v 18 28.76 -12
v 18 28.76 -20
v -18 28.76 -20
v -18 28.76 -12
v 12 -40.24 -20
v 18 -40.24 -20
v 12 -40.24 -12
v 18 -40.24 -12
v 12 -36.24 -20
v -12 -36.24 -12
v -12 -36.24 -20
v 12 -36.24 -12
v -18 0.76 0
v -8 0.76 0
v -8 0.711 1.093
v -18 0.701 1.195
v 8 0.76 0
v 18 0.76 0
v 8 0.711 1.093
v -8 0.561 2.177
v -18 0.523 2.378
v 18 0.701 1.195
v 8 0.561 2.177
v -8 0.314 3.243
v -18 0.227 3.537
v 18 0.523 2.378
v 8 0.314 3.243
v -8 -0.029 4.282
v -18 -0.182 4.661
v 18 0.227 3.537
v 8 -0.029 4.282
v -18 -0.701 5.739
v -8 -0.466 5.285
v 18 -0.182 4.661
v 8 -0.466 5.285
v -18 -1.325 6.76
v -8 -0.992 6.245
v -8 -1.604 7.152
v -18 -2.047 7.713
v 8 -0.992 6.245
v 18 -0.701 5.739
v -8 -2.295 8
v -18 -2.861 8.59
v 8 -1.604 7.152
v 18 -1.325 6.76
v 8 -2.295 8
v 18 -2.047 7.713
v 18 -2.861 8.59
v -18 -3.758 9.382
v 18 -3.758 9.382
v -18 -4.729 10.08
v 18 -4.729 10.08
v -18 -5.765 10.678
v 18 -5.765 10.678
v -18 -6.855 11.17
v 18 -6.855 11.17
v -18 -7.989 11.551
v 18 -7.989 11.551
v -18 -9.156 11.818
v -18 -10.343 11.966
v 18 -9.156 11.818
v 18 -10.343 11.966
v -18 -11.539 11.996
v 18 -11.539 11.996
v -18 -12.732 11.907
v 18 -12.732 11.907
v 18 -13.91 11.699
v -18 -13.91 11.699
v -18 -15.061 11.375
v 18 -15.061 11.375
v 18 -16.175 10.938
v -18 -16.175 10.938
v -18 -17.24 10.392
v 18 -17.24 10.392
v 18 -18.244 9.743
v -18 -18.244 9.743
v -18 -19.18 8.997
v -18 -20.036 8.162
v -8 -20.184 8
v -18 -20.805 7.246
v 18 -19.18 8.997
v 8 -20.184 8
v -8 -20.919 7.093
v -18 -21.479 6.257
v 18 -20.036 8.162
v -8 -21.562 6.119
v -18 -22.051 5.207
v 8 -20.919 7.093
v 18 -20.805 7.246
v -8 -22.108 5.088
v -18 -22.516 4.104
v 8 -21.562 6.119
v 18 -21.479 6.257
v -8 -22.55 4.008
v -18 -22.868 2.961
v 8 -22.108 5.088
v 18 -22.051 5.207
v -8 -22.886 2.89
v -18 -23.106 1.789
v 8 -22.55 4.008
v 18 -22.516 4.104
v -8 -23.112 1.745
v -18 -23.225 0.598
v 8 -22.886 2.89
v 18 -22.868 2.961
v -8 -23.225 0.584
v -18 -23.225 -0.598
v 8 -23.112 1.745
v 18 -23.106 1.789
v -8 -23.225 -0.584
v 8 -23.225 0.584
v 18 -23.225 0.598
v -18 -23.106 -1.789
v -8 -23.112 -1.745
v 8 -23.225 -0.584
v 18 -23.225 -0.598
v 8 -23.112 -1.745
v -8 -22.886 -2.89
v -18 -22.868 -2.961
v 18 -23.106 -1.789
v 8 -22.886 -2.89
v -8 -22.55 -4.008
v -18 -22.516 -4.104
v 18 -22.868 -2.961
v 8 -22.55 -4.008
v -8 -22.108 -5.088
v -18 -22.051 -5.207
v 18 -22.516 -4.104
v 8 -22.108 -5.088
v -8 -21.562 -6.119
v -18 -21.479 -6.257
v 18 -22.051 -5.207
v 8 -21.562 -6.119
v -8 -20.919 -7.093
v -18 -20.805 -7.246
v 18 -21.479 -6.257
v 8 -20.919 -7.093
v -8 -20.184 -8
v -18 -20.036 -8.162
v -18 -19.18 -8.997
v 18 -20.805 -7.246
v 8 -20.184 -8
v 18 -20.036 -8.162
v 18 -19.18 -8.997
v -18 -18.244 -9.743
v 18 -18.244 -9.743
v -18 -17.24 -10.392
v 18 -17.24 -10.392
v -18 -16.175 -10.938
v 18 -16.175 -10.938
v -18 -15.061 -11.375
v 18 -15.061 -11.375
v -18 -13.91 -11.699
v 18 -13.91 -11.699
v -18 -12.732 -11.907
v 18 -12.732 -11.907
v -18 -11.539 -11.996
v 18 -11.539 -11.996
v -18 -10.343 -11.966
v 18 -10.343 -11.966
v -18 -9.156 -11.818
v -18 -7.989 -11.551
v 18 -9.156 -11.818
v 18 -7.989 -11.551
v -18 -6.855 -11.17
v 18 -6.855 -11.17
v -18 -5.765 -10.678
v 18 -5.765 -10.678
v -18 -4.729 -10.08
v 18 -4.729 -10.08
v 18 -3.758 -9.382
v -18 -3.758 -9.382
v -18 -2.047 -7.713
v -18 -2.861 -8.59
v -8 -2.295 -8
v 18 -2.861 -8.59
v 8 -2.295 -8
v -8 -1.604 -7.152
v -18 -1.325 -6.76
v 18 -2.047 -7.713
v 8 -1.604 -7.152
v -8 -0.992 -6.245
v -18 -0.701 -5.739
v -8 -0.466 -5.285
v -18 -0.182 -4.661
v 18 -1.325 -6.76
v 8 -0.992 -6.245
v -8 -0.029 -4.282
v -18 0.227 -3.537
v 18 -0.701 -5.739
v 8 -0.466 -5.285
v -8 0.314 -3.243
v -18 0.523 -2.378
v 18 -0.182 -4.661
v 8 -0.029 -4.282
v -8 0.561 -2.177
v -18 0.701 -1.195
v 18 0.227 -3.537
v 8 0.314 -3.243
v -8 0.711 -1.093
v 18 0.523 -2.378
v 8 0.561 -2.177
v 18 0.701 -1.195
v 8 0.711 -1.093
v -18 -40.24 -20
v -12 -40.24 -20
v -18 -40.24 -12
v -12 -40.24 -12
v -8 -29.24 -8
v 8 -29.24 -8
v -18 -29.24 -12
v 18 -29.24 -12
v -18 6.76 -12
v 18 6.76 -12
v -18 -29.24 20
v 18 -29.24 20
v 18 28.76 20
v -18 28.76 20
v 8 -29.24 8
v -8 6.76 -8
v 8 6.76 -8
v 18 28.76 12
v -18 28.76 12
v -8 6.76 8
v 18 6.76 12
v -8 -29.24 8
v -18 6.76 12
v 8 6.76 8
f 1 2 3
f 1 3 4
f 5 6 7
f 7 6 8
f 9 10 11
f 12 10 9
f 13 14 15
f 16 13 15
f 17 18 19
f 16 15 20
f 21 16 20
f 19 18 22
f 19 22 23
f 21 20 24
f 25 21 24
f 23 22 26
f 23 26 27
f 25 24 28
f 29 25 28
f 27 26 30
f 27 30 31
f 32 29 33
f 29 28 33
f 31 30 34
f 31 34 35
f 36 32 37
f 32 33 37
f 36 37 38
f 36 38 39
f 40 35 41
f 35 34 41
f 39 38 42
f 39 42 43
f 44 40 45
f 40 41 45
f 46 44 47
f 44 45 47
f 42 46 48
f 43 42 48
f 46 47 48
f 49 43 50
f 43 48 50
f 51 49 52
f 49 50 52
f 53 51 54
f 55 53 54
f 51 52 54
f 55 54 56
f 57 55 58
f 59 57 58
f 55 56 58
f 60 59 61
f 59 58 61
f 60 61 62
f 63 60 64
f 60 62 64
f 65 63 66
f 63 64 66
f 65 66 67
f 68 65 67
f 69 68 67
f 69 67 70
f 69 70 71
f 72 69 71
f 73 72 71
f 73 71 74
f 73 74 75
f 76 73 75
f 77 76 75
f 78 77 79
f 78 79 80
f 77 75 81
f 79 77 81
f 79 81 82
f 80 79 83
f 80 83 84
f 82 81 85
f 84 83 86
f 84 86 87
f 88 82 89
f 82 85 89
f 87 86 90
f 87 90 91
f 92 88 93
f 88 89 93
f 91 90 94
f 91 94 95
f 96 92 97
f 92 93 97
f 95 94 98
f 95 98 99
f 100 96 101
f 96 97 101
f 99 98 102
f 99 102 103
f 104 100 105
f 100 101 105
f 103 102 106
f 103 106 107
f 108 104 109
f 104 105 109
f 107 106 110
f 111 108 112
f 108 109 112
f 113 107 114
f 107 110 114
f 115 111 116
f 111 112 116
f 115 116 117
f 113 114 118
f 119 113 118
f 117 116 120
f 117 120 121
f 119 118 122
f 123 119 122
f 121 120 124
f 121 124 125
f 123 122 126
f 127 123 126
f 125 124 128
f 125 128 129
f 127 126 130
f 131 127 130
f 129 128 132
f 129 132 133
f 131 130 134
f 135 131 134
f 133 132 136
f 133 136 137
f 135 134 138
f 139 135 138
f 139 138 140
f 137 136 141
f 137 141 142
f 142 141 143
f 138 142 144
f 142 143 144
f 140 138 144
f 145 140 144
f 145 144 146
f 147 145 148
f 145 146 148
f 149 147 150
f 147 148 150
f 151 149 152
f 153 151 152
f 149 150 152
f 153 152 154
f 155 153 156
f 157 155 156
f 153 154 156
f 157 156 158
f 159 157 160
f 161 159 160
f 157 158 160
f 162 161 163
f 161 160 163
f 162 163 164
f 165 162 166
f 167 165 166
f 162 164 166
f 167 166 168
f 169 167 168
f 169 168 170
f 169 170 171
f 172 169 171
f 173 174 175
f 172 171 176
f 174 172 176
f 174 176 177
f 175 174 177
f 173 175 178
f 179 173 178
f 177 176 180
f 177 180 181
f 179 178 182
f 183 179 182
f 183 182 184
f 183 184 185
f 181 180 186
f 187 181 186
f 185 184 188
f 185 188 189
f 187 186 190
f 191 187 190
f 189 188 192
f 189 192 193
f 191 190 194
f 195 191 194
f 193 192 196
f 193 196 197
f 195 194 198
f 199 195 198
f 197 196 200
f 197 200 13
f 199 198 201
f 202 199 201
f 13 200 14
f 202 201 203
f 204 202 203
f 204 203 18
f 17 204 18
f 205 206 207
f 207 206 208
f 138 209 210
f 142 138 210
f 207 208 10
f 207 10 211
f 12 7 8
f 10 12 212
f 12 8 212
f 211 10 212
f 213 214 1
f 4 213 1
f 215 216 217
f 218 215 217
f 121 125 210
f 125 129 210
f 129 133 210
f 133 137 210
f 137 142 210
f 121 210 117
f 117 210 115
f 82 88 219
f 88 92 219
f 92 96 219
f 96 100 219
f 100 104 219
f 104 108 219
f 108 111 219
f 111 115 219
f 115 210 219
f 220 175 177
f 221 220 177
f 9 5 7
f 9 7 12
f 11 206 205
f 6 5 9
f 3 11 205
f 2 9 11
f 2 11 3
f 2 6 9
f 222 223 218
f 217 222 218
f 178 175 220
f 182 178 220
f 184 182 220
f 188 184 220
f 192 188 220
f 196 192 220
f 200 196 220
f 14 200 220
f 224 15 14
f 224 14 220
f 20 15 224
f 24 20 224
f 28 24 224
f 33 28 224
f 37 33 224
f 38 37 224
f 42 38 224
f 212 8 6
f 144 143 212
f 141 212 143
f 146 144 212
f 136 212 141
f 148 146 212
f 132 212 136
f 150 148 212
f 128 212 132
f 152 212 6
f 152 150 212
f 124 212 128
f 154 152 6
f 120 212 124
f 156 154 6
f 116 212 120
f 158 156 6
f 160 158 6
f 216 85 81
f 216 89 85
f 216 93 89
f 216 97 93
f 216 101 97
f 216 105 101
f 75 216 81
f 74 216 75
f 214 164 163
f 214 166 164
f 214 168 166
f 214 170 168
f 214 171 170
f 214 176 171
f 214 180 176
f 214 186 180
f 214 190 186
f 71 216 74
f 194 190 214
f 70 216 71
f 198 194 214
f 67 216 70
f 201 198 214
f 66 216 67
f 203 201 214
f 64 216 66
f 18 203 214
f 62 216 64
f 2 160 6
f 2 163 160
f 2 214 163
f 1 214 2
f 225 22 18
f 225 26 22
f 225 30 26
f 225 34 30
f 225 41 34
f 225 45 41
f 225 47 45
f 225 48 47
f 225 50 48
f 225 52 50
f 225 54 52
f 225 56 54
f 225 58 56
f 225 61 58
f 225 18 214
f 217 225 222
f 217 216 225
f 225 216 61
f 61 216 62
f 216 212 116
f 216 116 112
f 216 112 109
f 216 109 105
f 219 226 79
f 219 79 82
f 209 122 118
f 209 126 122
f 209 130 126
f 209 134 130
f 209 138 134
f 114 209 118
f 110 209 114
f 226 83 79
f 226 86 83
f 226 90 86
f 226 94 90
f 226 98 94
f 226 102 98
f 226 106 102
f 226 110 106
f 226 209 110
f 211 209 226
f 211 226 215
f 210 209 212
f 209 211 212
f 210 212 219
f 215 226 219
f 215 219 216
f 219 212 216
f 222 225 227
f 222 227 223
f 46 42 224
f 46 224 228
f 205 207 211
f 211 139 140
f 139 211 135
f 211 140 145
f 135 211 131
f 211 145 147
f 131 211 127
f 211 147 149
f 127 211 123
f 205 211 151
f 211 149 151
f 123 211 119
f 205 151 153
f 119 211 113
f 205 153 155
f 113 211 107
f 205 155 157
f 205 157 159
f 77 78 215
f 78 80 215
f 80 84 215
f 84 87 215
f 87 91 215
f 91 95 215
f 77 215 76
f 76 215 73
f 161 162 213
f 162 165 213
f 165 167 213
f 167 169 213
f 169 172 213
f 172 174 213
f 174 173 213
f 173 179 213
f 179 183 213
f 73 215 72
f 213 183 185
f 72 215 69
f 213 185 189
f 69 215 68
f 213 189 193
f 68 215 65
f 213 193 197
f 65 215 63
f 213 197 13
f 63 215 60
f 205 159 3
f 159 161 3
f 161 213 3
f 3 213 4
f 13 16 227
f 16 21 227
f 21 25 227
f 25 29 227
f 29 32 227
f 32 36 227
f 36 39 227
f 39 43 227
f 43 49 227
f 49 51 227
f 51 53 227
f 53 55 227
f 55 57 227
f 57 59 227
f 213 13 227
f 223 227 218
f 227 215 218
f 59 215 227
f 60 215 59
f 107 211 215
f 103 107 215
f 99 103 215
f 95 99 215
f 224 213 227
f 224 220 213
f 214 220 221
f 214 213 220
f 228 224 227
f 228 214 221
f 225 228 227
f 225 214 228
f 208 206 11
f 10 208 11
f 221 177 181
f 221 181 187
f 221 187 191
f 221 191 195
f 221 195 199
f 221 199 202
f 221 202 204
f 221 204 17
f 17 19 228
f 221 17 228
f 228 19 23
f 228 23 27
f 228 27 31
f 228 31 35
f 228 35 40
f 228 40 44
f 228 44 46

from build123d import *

# Parameters (mm, degrees)
F0_W      = 69
F0_H      = 40
F1_DEPTH  = 18
F2_W      = 11
F2_H      = 32
F3_DEPTH  = 36.001
F4_W      = 22
F4_H      = 24
F5_DEPTH  = 36.001
F6_R      = 12
F7_DEPTH  = 36.001
F8_W      = 16
F8_H      = 16
F9_DEPTH  = 58.001
F10_W     = 24
F10_H     = 4
F11_DEPTH = 8.001


with BuildPart() as f1:
    # F0 (on Right) → F1 (new body, symmetric)
    with BuildSketch(Plane.YZ):
        with Locations((-5.739541, 0)):
            Rectangle(F0_W, F0_H)
    extrude(amount=F1_DEPTH, both=True)

    # F2 (on face) → F3 (cut, through all)
    with BuildSketch(Plane.YZ.offset(18)):
        with Locations((-34.739541, 4)):
            Rectangle(F2_W, F2_H)
    extrude(amount=-F3_DEPTH, mode=Mode.SUBTRACT)

    # F4 (on face) → F5 (cut, through all)
    with BuildSketch(Plane.YZ.offset(18)):
        with Locations((17.760459, 0)):
            Rectangle(F4_W, F4_H)
    extrude(amount=-F5_DEPTH, mode=Mode.SUBTRACT)

    # F6 (on face) → F7 (cut, through all)
    with BuildSketch(Plane.YZ.offset(18)):
        with Locations((-11.239541, 0)):
            Circle(F6_R)
    extrude(amount=-F7_DEPTH, mode=Mode.SUBTRACT)

    # F8 (on face) → F9 (cut, through all)
    with BuildSketch(Plane.XZ.offset(29.239541)):
        Rectangle(F8_W, F8_H)
    extrude(amount=-F9_DEPTH, mode=Mode.SUBTRACT)

    # F10 (on face) → F11 (cut, through all)
    with BuildSketch(Plane.XY.offset(-12)):
        with Locations((0, -38.239541)):
            Rectangle(F10_W, F10_H)
    extrude(amount=-F11_DEPTH, mode=Mode.SUBTRACT)


solid = f1.part
